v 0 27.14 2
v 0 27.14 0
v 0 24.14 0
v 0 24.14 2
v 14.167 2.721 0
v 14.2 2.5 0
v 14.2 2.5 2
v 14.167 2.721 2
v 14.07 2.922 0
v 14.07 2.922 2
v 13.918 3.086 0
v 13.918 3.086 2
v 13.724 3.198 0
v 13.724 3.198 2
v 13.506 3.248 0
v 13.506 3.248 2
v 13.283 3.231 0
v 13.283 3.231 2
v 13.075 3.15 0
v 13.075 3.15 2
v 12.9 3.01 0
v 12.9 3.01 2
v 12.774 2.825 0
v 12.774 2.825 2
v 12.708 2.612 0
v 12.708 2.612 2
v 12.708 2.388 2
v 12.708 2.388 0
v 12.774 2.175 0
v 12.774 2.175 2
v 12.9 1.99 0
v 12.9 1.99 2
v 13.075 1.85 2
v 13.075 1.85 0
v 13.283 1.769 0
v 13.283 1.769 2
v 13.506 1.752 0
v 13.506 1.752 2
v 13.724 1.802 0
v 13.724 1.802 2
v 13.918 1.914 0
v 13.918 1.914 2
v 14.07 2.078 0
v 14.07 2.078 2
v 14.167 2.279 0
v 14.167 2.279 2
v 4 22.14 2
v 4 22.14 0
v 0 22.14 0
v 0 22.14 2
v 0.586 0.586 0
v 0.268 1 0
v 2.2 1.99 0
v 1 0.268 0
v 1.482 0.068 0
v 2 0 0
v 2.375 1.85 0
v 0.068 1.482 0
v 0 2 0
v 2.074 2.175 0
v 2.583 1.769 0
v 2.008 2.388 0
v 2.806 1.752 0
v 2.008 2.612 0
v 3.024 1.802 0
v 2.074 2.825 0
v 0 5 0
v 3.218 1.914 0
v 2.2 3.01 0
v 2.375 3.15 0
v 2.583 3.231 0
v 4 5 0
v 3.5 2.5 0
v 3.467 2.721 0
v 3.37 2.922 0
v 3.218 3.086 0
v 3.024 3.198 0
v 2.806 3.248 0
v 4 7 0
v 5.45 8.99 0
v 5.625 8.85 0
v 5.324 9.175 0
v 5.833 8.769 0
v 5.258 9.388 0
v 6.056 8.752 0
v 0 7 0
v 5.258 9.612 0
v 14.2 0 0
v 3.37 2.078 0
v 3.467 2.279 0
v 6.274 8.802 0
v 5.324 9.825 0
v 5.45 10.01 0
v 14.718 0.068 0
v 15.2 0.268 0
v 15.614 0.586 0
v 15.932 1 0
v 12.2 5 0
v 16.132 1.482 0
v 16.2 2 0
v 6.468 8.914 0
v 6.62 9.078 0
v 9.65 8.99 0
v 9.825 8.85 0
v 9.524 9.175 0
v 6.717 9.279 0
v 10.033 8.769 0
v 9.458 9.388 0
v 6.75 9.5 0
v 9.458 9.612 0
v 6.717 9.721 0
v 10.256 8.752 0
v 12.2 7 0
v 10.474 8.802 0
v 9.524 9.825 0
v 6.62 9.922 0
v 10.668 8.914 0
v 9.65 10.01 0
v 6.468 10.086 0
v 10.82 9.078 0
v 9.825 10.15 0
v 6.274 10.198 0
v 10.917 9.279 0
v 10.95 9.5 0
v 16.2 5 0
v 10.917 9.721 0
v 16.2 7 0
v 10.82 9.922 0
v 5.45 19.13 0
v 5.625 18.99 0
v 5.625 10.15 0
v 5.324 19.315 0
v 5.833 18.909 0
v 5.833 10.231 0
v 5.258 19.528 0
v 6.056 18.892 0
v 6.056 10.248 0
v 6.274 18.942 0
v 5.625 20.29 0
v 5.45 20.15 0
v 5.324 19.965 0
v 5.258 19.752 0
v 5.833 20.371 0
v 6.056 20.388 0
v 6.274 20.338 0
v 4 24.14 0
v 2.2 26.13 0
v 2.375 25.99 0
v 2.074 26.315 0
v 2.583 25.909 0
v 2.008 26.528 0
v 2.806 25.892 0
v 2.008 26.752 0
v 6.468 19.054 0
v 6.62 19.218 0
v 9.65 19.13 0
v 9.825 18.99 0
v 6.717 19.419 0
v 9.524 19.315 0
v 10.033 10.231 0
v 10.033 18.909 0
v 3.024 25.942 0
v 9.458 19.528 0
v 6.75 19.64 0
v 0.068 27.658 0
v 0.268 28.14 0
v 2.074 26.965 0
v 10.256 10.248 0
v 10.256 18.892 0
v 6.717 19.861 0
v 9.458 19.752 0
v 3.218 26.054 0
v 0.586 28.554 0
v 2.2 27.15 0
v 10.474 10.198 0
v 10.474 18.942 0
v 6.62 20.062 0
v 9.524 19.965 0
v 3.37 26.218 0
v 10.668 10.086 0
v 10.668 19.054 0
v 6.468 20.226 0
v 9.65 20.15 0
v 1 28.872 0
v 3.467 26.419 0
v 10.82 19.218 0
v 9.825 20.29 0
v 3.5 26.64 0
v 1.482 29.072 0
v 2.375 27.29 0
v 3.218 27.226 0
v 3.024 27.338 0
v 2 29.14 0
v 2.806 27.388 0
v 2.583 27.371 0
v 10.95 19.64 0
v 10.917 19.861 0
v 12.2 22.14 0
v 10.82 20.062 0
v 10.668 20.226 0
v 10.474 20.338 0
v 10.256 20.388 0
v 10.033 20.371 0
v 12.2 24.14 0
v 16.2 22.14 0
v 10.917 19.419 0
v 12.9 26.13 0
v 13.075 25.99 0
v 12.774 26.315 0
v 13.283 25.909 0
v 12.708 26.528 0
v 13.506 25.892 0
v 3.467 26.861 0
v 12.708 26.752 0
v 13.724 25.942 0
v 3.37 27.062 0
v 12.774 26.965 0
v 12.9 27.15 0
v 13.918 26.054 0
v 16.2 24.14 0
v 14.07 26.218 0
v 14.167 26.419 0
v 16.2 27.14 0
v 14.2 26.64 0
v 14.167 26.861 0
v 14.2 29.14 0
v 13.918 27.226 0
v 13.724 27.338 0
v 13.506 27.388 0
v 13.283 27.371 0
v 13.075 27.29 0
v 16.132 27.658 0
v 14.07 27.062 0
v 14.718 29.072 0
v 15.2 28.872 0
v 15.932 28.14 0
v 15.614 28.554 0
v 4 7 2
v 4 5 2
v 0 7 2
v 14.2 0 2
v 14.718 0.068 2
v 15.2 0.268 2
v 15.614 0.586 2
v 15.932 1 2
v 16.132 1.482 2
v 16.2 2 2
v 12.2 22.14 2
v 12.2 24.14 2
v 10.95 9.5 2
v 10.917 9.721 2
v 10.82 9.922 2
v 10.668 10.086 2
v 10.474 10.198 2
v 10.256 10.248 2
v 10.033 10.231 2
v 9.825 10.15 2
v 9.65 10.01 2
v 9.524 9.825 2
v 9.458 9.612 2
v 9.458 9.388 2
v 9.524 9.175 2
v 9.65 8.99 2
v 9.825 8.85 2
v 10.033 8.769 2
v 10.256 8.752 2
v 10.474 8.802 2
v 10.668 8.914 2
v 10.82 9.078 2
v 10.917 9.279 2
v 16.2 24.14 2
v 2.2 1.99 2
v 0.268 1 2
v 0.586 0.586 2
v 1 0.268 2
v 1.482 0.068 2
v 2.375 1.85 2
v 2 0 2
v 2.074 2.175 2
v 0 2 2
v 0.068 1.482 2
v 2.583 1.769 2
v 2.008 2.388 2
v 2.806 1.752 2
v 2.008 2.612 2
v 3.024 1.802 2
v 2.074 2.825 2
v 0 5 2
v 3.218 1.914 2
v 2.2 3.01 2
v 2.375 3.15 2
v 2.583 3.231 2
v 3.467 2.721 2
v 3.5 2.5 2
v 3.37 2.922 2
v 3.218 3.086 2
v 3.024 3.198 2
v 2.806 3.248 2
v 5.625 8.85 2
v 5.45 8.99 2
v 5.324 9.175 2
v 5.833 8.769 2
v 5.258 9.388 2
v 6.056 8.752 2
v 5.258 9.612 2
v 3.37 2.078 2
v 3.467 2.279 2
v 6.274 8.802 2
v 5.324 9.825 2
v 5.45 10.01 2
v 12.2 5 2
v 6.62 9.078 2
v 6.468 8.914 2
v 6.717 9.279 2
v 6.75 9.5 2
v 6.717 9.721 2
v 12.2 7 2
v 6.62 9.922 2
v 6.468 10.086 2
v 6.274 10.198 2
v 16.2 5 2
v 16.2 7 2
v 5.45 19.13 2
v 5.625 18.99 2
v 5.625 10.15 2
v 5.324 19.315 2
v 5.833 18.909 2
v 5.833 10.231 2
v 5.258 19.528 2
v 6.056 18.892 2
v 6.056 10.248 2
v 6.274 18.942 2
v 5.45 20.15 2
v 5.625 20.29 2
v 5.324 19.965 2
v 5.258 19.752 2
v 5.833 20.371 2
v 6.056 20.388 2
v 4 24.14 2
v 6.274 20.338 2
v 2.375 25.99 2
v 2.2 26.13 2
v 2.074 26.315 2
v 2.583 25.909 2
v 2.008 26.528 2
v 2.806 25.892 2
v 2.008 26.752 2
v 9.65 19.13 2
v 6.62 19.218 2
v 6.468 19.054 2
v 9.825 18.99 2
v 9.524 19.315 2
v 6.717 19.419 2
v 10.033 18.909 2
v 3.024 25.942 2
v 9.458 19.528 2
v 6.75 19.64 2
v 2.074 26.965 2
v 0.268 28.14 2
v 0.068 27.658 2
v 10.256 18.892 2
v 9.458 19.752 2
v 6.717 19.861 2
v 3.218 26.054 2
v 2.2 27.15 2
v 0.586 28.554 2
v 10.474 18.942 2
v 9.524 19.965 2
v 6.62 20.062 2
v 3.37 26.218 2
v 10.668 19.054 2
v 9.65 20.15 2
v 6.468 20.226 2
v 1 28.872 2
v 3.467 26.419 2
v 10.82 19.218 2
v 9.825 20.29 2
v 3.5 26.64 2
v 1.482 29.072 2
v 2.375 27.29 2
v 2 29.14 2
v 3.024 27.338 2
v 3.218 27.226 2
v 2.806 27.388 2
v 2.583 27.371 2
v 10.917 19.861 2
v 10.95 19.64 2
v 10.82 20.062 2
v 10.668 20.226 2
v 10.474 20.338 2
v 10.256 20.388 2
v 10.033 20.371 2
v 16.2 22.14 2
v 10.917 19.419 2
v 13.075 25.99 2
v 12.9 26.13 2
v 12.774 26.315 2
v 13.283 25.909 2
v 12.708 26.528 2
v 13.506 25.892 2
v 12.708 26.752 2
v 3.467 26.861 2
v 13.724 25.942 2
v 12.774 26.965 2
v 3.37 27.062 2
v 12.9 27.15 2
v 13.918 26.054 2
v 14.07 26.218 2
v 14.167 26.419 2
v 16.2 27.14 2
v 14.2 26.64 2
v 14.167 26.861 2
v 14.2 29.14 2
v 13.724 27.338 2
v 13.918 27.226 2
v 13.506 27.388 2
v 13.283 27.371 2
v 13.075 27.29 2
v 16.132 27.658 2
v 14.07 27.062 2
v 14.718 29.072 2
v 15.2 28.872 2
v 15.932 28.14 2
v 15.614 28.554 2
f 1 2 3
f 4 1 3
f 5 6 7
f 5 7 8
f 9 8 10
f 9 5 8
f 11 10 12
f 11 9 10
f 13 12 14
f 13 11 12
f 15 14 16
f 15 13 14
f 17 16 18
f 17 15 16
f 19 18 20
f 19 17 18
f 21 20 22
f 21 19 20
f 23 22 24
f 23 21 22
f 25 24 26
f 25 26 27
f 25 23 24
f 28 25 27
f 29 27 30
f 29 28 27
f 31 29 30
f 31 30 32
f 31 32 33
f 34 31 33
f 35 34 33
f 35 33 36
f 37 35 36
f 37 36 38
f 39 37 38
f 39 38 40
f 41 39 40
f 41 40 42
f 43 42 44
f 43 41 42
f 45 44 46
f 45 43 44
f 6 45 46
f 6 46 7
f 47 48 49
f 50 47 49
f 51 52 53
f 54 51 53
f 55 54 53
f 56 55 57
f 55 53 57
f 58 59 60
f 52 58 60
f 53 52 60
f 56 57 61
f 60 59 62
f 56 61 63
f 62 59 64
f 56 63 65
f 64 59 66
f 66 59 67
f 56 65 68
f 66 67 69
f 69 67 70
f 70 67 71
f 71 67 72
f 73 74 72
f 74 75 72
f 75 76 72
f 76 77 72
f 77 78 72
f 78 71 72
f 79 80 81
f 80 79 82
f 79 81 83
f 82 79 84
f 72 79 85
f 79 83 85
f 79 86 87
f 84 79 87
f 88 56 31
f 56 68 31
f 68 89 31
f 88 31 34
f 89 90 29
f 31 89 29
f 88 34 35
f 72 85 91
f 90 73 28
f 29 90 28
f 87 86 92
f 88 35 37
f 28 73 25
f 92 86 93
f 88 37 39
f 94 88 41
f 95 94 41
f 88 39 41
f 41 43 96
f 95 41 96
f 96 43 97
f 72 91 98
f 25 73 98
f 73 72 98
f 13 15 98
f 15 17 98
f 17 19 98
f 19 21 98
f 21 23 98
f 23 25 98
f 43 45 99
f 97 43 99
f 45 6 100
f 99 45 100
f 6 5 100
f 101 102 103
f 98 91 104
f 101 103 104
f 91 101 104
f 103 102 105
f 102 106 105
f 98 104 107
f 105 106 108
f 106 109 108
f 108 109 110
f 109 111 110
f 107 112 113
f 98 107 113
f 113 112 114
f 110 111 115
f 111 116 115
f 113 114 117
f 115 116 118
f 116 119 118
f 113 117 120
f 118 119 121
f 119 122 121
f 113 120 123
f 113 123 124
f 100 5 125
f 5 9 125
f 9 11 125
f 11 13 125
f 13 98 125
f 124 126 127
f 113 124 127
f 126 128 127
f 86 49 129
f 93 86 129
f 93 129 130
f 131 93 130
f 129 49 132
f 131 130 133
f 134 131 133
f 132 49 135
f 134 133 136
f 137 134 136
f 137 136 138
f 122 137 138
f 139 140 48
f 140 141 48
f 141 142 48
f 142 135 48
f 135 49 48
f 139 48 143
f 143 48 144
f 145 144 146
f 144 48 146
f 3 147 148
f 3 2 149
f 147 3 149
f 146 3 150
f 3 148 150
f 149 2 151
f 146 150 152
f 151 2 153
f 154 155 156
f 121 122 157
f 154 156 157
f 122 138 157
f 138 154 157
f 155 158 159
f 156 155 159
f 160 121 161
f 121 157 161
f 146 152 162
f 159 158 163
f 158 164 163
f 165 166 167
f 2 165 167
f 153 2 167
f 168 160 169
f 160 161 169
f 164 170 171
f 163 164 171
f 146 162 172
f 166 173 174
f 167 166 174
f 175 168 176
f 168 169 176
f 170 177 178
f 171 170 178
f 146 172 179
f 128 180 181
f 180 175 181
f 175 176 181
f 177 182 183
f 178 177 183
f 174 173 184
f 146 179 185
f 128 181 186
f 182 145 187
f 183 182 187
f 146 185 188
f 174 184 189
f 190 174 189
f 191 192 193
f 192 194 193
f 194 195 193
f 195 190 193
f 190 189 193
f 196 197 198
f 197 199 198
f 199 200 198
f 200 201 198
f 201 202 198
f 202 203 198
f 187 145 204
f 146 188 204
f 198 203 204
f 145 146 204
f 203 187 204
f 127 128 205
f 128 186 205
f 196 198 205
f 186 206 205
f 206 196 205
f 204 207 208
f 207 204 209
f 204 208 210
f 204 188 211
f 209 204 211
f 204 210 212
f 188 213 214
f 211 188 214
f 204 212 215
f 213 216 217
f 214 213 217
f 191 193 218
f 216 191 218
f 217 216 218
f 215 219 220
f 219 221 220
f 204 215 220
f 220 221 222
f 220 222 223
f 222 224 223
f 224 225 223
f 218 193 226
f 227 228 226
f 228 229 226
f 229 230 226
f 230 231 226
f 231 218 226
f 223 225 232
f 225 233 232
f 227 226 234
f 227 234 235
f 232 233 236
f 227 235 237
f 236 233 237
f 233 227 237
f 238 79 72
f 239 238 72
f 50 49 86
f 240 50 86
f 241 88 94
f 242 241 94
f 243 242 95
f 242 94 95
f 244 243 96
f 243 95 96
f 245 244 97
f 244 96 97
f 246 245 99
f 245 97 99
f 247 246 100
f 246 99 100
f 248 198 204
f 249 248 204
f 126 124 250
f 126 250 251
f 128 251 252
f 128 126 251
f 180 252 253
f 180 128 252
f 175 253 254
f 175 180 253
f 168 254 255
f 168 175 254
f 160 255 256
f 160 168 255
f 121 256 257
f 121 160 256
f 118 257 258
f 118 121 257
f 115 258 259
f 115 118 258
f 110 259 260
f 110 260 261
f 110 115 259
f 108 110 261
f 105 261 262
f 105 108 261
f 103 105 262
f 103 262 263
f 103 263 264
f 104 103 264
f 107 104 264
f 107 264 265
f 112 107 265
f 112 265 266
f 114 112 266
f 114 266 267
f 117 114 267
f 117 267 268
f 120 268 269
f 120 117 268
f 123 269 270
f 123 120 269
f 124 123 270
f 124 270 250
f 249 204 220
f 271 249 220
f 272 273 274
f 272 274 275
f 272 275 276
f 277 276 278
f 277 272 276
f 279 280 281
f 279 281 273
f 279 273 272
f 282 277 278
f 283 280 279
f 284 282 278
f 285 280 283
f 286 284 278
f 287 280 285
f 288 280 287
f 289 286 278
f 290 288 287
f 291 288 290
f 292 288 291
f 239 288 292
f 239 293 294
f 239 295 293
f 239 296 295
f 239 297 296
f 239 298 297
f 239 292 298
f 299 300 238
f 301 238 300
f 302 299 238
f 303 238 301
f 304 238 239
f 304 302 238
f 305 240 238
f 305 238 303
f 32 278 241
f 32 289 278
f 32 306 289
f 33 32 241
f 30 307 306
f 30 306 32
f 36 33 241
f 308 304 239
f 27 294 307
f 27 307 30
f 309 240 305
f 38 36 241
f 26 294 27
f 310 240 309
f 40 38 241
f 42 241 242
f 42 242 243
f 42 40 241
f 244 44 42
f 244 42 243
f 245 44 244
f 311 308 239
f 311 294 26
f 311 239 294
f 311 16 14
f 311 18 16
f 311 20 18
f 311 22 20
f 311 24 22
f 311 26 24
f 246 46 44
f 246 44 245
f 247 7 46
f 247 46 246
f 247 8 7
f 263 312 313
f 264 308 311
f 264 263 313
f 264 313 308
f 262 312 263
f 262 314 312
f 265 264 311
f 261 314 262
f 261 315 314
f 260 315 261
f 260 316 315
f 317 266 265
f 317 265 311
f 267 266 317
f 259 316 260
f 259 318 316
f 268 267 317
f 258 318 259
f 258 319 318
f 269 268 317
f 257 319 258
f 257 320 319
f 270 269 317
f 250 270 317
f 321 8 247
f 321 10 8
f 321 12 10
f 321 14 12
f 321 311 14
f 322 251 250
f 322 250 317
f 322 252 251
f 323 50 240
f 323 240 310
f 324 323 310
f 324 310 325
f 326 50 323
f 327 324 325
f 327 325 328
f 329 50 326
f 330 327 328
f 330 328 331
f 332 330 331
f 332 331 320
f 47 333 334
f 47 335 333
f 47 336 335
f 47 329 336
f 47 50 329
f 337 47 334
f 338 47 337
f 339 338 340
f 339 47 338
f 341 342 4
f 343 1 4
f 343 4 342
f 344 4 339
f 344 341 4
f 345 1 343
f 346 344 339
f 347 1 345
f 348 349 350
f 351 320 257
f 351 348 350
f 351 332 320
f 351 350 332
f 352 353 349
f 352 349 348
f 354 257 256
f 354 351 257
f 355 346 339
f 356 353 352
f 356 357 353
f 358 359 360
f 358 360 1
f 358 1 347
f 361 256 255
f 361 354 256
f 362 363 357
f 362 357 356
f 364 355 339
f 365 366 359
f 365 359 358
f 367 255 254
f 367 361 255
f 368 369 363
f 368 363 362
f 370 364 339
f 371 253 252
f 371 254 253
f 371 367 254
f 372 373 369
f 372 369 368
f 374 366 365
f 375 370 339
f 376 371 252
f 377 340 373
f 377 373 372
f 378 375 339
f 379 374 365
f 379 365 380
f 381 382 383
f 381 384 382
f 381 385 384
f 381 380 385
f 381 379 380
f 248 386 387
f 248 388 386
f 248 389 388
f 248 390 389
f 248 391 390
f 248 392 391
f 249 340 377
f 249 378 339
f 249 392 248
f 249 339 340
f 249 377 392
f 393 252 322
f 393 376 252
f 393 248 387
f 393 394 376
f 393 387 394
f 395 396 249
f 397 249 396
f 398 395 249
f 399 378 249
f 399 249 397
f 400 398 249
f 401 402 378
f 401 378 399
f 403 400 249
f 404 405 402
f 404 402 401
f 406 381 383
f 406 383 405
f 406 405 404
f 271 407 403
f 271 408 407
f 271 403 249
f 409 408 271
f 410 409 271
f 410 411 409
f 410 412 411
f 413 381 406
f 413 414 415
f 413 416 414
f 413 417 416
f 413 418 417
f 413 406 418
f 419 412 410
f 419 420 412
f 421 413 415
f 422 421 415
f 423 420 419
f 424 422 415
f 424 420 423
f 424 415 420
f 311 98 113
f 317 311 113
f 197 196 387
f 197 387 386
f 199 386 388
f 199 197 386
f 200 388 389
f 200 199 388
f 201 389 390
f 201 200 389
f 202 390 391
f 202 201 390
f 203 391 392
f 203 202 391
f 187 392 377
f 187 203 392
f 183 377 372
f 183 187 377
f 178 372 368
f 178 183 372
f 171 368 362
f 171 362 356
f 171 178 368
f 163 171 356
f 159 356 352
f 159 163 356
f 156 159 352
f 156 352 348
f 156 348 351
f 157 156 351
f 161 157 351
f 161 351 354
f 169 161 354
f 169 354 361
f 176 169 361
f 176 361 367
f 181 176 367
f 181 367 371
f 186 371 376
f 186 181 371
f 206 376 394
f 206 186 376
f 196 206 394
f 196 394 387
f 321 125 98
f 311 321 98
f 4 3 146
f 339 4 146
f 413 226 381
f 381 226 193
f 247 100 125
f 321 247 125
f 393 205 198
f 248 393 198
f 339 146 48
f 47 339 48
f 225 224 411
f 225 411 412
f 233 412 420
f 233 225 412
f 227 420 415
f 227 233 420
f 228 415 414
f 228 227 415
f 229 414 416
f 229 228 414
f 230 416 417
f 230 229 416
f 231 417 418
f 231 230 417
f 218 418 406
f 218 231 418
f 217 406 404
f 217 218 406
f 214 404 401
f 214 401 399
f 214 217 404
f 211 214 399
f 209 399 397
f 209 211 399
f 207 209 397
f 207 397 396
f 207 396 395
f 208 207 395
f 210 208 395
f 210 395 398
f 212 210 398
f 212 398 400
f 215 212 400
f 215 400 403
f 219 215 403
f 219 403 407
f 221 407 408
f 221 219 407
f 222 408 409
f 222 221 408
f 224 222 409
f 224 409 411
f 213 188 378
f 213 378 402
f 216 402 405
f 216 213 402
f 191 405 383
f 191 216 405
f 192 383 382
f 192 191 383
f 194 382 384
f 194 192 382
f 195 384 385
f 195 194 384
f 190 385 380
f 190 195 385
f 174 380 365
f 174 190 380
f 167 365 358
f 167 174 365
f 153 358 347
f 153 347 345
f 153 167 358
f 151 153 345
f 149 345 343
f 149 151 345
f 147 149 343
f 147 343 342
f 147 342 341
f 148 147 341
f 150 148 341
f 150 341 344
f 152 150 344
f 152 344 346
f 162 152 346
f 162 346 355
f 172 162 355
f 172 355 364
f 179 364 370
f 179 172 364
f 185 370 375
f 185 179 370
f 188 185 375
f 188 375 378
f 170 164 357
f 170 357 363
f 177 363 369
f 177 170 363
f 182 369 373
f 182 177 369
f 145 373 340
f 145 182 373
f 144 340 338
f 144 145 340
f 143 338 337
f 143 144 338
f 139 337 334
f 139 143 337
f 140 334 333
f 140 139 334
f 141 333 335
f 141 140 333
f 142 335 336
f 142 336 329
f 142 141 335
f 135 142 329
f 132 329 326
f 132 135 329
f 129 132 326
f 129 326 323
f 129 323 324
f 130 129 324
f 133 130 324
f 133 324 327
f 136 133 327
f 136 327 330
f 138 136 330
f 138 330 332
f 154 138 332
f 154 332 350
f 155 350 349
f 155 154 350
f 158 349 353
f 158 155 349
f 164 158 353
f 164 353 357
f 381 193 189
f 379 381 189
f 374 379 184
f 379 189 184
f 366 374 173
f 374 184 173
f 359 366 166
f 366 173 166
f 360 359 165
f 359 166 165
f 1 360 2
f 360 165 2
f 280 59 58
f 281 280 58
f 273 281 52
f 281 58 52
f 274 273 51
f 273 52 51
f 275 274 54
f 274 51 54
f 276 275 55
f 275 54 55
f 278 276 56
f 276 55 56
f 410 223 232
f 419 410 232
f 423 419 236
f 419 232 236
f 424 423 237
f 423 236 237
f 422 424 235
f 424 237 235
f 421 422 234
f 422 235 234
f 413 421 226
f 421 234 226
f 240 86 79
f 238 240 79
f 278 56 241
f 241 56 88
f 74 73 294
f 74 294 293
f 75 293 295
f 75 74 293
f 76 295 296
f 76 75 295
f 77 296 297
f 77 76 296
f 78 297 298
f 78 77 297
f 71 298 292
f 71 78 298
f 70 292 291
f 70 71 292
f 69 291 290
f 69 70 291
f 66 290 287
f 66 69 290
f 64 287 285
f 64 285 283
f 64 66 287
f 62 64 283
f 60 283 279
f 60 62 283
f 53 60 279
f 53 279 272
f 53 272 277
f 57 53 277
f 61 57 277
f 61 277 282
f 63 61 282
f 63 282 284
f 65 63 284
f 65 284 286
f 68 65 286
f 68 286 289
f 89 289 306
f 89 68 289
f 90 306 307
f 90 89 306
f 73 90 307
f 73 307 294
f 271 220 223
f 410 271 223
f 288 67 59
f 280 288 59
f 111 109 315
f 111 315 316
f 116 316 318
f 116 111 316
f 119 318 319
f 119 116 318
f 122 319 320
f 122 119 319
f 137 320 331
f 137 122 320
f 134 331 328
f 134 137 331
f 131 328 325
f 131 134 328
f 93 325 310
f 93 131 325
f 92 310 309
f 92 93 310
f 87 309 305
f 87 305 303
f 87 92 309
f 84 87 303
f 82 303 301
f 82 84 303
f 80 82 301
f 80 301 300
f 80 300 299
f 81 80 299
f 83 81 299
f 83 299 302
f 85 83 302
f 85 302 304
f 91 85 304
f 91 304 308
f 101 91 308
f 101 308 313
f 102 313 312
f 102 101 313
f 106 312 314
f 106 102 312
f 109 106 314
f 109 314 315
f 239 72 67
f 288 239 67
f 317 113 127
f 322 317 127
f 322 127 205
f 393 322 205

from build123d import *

# Parameters (mm, degrees)
SKETCH1_R           = 0.75
BOSS_EXTRUDE1_DEPTH = 2


with BuildPart() as part:
    # Sketch1 → Boss-Extrude1 (new body)
    with BuildSketch(Plane.XY):
        with BuildLine():
            Line((0, 22.14), (0, 7))
            Line((0, 7), (4, 7))
            Line((4, 7), (4, 5))
            Line((4, 5), (0, 5))
            Line((0, 5), (0, 2))
            ThreePointArc((0, 2), (0.585786438, 0.585786438), (2, 0))
            Line((2, 0), (14.2, 0))
            ThreePointArc((14.2, 0), (15.614213562, 0.585786438), (16.2, 2))
            Line((16.2, 2), (16.2, 5))
            Line((16.2, 5), (12.2, 5))
            Line((12.2, 5), (12.2, 7))
            Line((12.2, 7), (16.2, 7))
            Line((16.2, 7), (16.2, 22.14))
            Line((16.2, 22.14), (12.2, 22.14))
            Line((12.2, 22.14), (12.2, 24.14))
            Line((12.2, 24.14), (16.2, 24.14))
            Line((16.2, 24.14), (16.2, 27.14))
            ThreePointArc((16.2, 27.14), (15.614213562, 28.554213562), (14.2, 29.14))
            Line((14.2, 29.14), (2, 29.14))
            ThreePointArc((2, 29.14), (0.585786438, 28.554213562), (0, 27.14))
            Line((0, 27.14), (0, 24.14))
            Line((0, 24.14), (4, 24.14))
            Line((4, 24.14), (4, 22.14))
            Line((4, 22.14), (0, 22.14))
        make_face()
        with Locations((13.45, 2.5)):
            Circle(SKETCH1_R, mode=Mode.SUBTRACT)
        with Locations((10.2, 9.5)):
            Circle(SKETCH1_R, mode=Mode.SUBTRACT)
        with Locations((2.75, 26.64)):
            Circle(SKETCH1_R, mode=Mode.SUBTRACT)
        with Locations((6, 19.64)):
            Circle(SKETCH1_R, mode=Mode.SUBTRACT)
        with Locations((6, 9.5)):
            Circle(SKETCH1_R, mode=Mode.SUBTRACT)
        with Locations((2.75, 2.5)):
            Circle(SKETCH1_R, mode=Mode.SUBTRACT)
        with Locations((10.2, 19.64)):
            Circle(SKETCH1_R, mode=Mode.SUBTRACT)
        with Locations((13.45, 26.64)):
            Circle(SKETCH1_R, mode=Mode.SUBTRACT)
    extrude(amount=BOSS_EXTRUDE1_DEPTH)


solid = part.part
